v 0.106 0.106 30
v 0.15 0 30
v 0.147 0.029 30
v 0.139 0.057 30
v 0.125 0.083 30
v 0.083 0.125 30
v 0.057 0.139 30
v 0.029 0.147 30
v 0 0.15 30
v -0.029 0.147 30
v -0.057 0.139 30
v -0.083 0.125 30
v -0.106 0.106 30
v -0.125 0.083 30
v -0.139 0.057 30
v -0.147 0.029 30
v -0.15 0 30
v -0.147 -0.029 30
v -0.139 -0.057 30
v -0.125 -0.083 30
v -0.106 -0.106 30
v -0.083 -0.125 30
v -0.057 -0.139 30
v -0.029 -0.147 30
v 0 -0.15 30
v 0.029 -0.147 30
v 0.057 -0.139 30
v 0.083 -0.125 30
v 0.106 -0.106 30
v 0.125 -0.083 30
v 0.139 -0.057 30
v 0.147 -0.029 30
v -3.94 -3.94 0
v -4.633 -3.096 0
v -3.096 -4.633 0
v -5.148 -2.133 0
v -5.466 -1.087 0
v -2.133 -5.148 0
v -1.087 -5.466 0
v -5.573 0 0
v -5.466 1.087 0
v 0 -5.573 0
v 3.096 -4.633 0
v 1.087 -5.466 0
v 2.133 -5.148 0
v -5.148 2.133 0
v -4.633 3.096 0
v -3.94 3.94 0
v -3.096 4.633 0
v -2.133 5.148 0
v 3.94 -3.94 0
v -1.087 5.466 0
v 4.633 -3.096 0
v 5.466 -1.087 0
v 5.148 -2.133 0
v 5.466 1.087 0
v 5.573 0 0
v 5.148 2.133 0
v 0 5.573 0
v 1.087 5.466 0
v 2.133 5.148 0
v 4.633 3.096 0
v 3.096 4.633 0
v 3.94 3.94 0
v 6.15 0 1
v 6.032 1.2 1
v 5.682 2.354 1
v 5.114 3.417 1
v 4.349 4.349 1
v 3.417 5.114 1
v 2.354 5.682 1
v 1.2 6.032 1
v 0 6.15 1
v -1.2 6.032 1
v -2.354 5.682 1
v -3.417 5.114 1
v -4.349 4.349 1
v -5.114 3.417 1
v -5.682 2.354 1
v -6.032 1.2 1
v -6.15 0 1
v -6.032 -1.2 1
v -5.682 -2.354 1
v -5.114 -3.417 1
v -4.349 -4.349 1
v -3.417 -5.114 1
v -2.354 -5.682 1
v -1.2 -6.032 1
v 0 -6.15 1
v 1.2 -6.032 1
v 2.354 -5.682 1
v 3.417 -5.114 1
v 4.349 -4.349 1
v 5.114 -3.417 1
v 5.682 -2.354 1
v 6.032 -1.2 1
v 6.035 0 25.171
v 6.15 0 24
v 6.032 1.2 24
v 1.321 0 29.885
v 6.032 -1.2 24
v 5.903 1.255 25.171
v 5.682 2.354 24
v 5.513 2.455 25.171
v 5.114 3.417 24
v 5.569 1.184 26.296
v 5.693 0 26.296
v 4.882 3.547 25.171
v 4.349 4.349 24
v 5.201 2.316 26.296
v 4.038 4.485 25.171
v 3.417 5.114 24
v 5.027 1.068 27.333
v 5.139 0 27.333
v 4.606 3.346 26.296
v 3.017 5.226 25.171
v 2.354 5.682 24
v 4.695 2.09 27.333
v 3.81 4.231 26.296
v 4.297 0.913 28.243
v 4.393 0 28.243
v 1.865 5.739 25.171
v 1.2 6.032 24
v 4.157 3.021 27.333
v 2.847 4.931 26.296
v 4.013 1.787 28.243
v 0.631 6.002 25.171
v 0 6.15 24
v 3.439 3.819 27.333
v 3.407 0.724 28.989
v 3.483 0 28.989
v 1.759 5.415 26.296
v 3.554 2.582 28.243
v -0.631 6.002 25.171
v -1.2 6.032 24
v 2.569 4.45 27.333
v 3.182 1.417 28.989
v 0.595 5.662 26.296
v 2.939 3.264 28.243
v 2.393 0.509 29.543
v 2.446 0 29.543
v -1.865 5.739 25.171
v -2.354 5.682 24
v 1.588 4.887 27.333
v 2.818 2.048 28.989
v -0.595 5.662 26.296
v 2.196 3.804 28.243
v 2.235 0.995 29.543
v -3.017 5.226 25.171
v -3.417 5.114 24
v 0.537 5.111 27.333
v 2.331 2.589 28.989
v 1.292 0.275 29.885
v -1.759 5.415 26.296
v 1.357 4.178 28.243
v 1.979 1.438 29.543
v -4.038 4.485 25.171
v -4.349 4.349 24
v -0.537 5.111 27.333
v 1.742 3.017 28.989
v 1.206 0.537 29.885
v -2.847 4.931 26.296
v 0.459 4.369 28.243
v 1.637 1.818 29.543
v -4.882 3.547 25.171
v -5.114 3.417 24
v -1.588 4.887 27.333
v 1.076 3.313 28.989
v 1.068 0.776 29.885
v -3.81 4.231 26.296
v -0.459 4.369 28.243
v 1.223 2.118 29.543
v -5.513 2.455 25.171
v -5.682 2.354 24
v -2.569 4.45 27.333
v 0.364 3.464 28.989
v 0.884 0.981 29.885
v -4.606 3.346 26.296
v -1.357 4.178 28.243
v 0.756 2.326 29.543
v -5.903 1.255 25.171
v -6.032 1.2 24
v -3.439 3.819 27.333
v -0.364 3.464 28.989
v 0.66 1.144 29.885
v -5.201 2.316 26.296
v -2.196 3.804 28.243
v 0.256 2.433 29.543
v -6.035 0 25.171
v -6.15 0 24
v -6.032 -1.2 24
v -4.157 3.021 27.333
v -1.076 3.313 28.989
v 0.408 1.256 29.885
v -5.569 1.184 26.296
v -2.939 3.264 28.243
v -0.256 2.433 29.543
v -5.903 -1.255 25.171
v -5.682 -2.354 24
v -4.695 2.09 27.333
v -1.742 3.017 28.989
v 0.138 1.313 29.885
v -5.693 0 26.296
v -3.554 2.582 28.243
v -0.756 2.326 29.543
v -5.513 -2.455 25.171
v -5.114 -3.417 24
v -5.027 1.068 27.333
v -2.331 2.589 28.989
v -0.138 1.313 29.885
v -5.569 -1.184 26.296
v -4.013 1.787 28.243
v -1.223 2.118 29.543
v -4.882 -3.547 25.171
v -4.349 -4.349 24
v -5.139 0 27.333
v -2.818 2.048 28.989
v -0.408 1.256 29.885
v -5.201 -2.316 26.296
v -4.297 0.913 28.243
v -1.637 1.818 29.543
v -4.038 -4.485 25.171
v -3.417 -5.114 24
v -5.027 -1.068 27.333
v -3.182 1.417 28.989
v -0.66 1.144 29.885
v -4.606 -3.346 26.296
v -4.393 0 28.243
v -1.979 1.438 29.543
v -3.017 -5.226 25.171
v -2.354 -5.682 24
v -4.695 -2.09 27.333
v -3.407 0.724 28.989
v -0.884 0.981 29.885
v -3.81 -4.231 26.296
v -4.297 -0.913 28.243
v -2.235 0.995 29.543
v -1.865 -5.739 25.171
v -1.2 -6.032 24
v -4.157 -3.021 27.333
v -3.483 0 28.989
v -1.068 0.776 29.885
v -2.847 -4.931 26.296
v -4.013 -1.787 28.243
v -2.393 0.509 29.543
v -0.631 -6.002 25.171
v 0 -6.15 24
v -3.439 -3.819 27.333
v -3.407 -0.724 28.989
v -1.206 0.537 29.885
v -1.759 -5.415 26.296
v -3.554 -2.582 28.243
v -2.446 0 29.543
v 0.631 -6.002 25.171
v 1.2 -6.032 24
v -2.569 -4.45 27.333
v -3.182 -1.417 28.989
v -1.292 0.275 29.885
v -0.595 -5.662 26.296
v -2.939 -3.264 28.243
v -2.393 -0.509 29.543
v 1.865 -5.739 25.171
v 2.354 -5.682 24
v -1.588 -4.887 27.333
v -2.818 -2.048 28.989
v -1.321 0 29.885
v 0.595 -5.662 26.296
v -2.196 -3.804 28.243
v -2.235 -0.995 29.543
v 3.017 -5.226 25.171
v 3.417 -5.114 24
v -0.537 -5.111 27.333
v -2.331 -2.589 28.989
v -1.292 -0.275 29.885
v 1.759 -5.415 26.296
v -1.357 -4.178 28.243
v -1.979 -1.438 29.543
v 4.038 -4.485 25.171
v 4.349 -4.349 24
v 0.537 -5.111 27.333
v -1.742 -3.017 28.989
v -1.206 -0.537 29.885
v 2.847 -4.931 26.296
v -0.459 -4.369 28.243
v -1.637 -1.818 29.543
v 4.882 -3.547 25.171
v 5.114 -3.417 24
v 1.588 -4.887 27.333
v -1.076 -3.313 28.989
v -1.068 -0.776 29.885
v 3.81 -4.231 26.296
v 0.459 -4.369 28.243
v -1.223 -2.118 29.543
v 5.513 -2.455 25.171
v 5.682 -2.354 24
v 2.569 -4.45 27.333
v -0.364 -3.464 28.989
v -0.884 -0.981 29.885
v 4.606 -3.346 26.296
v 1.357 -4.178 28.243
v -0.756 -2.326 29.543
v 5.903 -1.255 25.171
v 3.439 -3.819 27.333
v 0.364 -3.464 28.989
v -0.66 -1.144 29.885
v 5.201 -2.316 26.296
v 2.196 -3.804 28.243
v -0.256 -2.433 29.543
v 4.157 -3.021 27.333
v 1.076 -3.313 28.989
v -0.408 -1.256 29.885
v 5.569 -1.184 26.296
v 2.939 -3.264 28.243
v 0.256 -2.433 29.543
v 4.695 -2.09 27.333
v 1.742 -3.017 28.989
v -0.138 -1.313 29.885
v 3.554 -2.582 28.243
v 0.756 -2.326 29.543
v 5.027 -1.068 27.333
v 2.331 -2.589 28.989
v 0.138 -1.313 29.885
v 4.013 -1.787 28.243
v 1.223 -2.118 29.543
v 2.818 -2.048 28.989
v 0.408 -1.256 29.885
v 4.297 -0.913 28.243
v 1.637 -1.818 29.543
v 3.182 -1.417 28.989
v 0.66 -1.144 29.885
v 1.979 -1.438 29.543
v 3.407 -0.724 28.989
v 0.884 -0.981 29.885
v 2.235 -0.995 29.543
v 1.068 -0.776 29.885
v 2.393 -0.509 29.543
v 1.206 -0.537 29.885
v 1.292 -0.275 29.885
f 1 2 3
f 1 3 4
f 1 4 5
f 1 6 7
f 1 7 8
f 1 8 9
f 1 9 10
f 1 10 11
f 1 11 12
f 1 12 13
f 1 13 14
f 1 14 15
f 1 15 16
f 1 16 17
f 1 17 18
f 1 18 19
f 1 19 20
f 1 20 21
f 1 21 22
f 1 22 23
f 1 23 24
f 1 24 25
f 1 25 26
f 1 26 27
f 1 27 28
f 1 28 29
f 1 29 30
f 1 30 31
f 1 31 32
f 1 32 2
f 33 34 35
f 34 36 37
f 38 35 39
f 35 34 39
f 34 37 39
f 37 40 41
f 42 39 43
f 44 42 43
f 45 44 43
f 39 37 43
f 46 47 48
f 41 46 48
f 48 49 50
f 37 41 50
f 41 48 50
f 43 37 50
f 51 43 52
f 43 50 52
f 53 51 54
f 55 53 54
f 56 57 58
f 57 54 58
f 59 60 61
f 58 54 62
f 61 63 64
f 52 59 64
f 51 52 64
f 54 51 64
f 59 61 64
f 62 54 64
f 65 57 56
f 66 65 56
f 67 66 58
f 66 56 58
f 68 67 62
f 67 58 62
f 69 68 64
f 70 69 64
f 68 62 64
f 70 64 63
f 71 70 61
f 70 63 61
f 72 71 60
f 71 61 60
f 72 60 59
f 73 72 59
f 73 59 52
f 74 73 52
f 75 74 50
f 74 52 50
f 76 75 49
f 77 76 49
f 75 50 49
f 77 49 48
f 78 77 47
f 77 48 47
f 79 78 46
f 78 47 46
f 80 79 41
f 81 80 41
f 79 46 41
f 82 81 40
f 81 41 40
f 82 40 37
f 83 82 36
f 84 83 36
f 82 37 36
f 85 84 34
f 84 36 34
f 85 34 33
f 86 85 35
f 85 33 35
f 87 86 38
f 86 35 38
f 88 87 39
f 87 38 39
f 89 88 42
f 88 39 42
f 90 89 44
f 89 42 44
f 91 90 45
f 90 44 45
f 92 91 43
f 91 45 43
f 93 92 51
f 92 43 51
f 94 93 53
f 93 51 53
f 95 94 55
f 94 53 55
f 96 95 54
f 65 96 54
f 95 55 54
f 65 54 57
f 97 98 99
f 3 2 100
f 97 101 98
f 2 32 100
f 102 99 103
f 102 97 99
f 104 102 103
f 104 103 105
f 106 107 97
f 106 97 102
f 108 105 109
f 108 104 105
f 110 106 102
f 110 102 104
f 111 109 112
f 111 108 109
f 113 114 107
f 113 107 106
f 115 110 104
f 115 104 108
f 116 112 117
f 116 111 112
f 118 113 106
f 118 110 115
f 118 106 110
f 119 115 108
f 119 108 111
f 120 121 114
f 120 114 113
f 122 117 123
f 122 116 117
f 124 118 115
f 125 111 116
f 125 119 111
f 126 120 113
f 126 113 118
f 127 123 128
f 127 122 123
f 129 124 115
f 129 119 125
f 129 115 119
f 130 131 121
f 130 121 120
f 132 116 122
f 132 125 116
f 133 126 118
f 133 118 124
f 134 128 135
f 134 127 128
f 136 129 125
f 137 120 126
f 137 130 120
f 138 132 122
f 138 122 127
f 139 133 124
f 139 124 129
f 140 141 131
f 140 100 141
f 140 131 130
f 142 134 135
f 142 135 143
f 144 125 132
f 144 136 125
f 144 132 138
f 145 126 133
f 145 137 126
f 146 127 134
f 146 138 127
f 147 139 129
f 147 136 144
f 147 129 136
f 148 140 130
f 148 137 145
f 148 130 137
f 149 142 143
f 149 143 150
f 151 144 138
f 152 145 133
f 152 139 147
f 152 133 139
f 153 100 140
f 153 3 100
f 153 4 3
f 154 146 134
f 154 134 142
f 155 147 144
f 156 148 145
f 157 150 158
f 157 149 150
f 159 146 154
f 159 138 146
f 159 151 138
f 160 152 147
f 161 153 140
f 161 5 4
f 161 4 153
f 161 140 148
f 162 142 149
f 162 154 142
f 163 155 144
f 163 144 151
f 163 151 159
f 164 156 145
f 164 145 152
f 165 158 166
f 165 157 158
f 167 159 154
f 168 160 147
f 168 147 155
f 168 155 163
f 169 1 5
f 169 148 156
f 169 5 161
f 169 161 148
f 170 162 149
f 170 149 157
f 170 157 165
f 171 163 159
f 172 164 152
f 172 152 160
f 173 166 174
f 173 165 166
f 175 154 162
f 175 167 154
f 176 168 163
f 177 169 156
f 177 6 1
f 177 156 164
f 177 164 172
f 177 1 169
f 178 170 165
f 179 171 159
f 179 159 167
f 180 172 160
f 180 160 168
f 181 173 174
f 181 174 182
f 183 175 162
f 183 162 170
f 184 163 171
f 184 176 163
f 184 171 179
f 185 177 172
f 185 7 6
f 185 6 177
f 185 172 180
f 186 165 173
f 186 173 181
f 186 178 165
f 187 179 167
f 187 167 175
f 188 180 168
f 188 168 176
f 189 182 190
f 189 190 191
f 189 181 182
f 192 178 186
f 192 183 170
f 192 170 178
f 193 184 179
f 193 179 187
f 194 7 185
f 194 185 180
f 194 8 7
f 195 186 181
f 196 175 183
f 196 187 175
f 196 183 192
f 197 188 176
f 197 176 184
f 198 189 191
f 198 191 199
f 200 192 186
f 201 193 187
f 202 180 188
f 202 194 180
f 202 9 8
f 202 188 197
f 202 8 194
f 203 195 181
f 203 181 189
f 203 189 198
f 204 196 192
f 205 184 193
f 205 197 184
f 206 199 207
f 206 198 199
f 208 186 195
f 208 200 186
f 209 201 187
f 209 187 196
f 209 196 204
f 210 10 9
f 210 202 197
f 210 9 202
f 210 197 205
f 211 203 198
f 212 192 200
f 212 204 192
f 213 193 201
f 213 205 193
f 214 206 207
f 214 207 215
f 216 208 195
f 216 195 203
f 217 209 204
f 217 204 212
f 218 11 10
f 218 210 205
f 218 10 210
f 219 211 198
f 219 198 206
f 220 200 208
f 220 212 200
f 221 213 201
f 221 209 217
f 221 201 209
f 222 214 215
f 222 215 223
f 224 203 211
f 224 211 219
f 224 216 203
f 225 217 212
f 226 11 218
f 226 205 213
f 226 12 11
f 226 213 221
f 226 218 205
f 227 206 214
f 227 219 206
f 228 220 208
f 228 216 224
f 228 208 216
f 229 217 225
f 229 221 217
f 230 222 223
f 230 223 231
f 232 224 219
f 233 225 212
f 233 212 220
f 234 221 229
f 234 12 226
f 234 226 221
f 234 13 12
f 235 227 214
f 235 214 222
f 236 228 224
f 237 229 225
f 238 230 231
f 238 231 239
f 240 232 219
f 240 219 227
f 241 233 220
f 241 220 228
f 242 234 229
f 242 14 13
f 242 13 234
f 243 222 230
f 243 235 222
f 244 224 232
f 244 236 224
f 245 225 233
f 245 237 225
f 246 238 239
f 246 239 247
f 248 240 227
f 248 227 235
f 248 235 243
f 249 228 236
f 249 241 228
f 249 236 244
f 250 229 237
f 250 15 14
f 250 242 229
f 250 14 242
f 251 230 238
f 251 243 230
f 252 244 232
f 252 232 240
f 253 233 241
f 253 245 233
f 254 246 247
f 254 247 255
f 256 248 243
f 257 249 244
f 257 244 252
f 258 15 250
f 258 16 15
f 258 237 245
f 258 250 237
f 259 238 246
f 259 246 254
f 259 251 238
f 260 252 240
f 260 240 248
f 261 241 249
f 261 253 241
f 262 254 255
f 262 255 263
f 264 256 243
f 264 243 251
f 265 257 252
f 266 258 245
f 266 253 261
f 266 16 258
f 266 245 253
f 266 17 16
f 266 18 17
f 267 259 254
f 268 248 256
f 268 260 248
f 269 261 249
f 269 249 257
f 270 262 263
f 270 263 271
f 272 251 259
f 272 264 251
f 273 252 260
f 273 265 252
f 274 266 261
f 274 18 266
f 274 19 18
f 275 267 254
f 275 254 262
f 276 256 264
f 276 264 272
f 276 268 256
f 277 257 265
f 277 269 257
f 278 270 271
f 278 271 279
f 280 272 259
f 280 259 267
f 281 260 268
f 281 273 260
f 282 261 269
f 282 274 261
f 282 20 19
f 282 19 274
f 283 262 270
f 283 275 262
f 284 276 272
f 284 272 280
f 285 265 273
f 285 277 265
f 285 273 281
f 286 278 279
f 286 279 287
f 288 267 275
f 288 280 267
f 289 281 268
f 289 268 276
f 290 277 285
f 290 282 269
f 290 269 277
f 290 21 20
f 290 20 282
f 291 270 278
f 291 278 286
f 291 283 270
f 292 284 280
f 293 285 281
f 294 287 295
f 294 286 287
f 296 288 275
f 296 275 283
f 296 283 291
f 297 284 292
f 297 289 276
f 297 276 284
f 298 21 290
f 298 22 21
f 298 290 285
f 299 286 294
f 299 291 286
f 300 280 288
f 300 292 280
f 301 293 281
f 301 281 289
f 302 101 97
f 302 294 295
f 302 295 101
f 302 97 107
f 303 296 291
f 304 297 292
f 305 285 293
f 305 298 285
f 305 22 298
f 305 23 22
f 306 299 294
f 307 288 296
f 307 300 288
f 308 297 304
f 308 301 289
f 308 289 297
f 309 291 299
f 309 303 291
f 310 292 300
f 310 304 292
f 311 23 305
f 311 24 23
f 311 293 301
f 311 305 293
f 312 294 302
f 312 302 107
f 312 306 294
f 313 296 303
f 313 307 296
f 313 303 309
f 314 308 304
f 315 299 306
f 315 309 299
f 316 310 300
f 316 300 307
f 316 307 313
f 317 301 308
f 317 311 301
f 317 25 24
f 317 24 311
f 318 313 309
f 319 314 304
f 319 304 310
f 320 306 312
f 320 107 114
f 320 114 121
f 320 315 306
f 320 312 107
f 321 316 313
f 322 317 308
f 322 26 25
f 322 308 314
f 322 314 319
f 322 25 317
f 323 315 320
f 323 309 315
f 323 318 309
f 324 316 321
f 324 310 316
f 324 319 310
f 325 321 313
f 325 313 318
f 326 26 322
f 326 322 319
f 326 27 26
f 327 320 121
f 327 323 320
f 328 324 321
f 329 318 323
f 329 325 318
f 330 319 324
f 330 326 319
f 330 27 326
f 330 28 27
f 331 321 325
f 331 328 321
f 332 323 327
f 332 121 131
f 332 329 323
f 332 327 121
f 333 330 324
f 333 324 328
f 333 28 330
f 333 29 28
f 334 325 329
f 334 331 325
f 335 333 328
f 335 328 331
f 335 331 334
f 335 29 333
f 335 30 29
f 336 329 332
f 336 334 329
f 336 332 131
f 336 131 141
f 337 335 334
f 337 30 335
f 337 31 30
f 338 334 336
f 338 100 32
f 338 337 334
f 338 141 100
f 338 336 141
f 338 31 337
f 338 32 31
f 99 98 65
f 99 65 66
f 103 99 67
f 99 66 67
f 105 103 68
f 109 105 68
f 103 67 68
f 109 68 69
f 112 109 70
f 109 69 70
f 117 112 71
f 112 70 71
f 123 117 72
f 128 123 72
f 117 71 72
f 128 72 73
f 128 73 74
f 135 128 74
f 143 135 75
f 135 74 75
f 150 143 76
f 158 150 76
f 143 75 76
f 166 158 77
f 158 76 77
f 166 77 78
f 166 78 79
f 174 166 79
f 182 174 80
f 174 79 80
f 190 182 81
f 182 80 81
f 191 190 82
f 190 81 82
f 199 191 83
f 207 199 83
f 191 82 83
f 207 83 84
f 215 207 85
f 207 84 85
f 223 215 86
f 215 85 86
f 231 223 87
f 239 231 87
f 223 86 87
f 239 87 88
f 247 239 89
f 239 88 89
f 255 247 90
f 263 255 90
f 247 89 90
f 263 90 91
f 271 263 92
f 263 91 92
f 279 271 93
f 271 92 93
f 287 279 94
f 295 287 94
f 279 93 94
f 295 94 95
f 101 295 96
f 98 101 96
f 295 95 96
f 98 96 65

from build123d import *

# Parameters (mm, degrees)
F0_R     = 6.15
F1_DEPTH = 30
F2_R     = 6
F3_SIZE2 = 0.57735
F3_SIZE  = 1


with BuildPart() as f1:
    # F0 (on Top) → F1 (new body)
    with BuildSketch(Plane.XY):
        Circle(F0_R)
    extrude(amount=F1_DEPTH)

    # F2
    f2_edges = [f1.edges().sort_by_distance(p)[0] for p in [
        (-6.15, 0, 30),
    ]]
    fillet(f2_edges, radius=F2_R)

    # F3
    f3_edges = [f1.edges().sort_by_distance(p)[0] for p in [
        (-6.15, 0, 0),
    ]]
    chamfer(f3_edges, length=F3_SIZE, length2=F3_SIZE2)


solid = f1.part
